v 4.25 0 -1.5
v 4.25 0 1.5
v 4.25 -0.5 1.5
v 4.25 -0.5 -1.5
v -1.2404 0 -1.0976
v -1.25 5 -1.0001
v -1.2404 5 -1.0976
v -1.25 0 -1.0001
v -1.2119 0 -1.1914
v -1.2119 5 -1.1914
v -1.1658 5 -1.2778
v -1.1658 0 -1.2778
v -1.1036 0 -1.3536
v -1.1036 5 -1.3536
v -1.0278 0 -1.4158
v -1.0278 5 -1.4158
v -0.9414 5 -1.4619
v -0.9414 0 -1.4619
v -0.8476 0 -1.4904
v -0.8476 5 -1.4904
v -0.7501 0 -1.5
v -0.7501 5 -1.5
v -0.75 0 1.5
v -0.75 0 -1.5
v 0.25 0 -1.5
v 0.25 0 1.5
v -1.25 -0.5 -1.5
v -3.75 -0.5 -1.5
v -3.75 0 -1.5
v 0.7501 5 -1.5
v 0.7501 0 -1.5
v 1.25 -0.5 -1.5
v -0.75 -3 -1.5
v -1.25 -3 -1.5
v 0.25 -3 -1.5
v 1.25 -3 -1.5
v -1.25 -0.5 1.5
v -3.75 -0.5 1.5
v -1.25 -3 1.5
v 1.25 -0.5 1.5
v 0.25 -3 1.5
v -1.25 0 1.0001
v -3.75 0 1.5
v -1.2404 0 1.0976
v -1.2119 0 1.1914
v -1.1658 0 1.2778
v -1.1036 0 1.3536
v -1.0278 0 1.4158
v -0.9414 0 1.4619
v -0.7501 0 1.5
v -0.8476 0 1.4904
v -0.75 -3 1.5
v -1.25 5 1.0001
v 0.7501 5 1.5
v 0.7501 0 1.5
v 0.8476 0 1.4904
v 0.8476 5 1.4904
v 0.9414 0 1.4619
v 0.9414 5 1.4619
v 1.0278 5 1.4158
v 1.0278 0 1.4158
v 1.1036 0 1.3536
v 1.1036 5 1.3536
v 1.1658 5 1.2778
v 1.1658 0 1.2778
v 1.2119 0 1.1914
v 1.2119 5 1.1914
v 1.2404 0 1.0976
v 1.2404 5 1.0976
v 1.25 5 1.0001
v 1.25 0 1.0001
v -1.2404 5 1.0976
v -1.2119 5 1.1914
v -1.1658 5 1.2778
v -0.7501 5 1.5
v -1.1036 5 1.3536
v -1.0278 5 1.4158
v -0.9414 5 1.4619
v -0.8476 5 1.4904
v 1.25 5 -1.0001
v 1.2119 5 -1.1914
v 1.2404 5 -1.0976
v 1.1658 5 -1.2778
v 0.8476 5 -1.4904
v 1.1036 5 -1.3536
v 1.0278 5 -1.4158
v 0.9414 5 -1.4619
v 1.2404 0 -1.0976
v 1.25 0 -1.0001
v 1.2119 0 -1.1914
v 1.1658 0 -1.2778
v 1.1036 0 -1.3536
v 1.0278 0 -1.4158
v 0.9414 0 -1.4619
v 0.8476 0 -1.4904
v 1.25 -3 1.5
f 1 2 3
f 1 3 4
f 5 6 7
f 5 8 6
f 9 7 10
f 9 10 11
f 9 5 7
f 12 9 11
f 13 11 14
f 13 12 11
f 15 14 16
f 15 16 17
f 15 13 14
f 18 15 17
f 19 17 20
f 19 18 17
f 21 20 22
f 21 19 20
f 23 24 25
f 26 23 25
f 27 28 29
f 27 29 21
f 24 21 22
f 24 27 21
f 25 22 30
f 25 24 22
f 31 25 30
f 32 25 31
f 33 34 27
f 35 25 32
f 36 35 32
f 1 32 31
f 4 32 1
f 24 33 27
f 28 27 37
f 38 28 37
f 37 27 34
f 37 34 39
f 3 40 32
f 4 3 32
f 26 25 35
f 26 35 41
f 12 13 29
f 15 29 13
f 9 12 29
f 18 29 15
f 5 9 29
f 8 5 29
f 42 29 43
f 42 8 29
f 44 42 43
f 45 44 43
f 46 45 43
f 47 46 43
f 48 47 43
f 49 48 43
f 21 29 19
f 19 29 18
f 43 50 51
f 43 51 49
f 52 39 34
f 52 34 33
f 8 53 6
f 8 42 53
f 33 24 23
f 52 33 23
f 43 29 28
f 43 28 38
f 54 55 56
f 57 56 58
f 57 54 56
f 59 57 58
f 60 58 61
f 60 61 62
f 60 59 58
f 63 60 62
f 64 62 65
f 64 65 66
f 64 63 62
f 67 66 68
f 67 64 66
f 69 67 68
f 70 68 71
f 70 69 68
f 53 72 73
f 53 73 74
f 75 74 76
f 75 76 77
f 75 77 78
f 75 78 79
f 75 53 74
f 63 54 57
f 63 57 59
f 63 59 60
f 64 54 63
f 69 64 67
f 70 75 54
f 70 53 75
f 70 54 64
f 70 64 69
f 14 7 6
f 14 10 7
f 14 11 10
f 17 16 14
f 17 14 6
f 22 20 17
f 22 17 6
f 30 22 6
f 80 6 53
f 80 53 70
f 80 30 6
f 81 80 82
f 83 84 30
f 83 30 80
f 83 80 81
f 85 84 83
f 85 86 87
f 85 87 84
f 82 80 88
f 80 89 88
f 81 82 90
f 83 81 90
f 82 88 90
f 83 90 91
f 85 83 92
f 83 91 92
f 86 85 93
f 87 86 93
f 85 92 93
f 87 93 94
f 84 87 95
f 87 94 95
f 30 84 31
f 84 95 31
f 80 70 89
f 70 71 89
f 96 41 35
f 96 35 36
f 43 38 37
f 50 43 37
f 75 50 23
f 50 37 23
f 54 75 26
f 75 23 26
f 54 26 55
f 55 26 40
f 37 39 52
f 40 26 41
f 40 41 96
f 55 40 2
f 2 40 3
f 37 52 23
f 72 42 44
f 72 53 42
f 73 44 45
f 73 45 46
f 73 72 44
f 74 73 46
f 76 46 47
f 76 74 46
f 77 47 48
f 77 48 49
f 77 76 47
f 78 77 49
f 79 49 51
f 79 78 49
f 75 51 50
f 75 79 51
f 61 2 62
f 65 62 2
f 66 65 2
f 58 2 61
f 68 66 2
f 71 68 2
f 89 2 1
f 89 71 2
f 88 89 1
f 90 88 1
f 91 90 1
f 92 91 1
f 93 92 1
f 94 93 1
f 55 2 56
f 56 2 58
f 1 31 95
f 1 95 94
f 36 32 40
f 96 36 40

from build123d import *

# Parameters (mm, degrees)
SKETCH1_W           = 2.5
SKETCH1_H           = 3
BOSS_EXTRUDE1_DEPTH = 1
SKETCH2_W           = 1
SKETCH2_H           = 3
BOSS_EXTRUDE2_DEPTH = 3
SKETCH3_W           = 0.5
SKETCH3_H           = 3
BOSS_EXTRUDE3_DEPTH = 3
SKETCH4_W           = 3
SKETCH4_H           = 0.5
BOSS_EXTRUDE4_DEPTH = 3
SKETCH5_W           = 3
SKETCH5_H           = 0.5
BOSS_EXTRUDE5_DEPTH = 2.5
SKETCH8_W           = 2.5
SKETCH8_H           = 3
BOSS_EXTRUDE6_DEPTH = 4
FILLET1_R           = 0.5


with BuildPart() as part:
    # Sketch1 → Boss-Extrude1 (new body)
    with BuildSketch(Plane(origin=(0, 0, 0), x_dir=(1, 0, 0), z_dir=(0, 1, 0))):
        Rectangle(SKETCH1_W, SKETCH1_H)
    extrude(amount=BOSS_EXTRUDE1_DEPTH)

    # Sketch2 → Boss-Extrude2 (add)
    with BuildSketch(Plane.XZ):
        with Locations((0.75, 0)):
            Rectangle(SKETCH2_W, SKETCH2_H)
    extrude(amount=BOSS_EXTRUDE2_DEPTH)

    # Sketch3 → Boss-Extrude3 (add)
    with BuildSketch(Plane.XZ):
        with Locations((-1, 0)):
            Rectangle(SKETCH3_W, SKETCH3_H)
    extrude(amount=BOSS_EXTRUDE3_DEPTH)

    # Sketch4 → Boss-Extrude4 (add)
    with BuildSketch(Plane(origin=(1.25, 0, 0), x_dir=(0, 0, -1), z_dir=(1, 0, 0))):
        with Locations((0, -0.25)):
            Rectangle(SKETCH4_W, SKETCH4_H)
    extrude(amount=BOSS_EXTRUDE4_DEPTH)

    # Sketch5 → Boss-Extrude5 (add)
    with BuildSketch(Plane.ZY.offset(1.25)):
        with Locations((0, -0.25)):
            Rectangle(SKETCH5_W, SKETCH5_H)
    extrude(amount=BOSS_EXTRUDE5_DEPTH)

    # Sketch8 → Boss-Extrude6 (add)
    with BuildSketch(Plane(origin=(0, 1, 0), x_dir=(1, 0, 0), z_dir=(0, 1, 0))):
        Rectangle(SKETCH8_W, SKETCH8_H)
    extrude(amount=BOSS_EXTRUDE6_DEPTH)

    # Fillet1
    fillet1_edges = [part.edges().sort_by_distance(p)[0] for p in [
        (1.25, 2.5, 1.5),
        (-1.25, 2.5, 1.5),
        (-1.25, 2.5, -1.5),
        (1.25, 2.5, -1.5),
    ]]
    fillet(fillet1_edges, radius=FILLET1_R - 0.0001)  # a hair under: the kernel refuses the full size


solid = part.part
